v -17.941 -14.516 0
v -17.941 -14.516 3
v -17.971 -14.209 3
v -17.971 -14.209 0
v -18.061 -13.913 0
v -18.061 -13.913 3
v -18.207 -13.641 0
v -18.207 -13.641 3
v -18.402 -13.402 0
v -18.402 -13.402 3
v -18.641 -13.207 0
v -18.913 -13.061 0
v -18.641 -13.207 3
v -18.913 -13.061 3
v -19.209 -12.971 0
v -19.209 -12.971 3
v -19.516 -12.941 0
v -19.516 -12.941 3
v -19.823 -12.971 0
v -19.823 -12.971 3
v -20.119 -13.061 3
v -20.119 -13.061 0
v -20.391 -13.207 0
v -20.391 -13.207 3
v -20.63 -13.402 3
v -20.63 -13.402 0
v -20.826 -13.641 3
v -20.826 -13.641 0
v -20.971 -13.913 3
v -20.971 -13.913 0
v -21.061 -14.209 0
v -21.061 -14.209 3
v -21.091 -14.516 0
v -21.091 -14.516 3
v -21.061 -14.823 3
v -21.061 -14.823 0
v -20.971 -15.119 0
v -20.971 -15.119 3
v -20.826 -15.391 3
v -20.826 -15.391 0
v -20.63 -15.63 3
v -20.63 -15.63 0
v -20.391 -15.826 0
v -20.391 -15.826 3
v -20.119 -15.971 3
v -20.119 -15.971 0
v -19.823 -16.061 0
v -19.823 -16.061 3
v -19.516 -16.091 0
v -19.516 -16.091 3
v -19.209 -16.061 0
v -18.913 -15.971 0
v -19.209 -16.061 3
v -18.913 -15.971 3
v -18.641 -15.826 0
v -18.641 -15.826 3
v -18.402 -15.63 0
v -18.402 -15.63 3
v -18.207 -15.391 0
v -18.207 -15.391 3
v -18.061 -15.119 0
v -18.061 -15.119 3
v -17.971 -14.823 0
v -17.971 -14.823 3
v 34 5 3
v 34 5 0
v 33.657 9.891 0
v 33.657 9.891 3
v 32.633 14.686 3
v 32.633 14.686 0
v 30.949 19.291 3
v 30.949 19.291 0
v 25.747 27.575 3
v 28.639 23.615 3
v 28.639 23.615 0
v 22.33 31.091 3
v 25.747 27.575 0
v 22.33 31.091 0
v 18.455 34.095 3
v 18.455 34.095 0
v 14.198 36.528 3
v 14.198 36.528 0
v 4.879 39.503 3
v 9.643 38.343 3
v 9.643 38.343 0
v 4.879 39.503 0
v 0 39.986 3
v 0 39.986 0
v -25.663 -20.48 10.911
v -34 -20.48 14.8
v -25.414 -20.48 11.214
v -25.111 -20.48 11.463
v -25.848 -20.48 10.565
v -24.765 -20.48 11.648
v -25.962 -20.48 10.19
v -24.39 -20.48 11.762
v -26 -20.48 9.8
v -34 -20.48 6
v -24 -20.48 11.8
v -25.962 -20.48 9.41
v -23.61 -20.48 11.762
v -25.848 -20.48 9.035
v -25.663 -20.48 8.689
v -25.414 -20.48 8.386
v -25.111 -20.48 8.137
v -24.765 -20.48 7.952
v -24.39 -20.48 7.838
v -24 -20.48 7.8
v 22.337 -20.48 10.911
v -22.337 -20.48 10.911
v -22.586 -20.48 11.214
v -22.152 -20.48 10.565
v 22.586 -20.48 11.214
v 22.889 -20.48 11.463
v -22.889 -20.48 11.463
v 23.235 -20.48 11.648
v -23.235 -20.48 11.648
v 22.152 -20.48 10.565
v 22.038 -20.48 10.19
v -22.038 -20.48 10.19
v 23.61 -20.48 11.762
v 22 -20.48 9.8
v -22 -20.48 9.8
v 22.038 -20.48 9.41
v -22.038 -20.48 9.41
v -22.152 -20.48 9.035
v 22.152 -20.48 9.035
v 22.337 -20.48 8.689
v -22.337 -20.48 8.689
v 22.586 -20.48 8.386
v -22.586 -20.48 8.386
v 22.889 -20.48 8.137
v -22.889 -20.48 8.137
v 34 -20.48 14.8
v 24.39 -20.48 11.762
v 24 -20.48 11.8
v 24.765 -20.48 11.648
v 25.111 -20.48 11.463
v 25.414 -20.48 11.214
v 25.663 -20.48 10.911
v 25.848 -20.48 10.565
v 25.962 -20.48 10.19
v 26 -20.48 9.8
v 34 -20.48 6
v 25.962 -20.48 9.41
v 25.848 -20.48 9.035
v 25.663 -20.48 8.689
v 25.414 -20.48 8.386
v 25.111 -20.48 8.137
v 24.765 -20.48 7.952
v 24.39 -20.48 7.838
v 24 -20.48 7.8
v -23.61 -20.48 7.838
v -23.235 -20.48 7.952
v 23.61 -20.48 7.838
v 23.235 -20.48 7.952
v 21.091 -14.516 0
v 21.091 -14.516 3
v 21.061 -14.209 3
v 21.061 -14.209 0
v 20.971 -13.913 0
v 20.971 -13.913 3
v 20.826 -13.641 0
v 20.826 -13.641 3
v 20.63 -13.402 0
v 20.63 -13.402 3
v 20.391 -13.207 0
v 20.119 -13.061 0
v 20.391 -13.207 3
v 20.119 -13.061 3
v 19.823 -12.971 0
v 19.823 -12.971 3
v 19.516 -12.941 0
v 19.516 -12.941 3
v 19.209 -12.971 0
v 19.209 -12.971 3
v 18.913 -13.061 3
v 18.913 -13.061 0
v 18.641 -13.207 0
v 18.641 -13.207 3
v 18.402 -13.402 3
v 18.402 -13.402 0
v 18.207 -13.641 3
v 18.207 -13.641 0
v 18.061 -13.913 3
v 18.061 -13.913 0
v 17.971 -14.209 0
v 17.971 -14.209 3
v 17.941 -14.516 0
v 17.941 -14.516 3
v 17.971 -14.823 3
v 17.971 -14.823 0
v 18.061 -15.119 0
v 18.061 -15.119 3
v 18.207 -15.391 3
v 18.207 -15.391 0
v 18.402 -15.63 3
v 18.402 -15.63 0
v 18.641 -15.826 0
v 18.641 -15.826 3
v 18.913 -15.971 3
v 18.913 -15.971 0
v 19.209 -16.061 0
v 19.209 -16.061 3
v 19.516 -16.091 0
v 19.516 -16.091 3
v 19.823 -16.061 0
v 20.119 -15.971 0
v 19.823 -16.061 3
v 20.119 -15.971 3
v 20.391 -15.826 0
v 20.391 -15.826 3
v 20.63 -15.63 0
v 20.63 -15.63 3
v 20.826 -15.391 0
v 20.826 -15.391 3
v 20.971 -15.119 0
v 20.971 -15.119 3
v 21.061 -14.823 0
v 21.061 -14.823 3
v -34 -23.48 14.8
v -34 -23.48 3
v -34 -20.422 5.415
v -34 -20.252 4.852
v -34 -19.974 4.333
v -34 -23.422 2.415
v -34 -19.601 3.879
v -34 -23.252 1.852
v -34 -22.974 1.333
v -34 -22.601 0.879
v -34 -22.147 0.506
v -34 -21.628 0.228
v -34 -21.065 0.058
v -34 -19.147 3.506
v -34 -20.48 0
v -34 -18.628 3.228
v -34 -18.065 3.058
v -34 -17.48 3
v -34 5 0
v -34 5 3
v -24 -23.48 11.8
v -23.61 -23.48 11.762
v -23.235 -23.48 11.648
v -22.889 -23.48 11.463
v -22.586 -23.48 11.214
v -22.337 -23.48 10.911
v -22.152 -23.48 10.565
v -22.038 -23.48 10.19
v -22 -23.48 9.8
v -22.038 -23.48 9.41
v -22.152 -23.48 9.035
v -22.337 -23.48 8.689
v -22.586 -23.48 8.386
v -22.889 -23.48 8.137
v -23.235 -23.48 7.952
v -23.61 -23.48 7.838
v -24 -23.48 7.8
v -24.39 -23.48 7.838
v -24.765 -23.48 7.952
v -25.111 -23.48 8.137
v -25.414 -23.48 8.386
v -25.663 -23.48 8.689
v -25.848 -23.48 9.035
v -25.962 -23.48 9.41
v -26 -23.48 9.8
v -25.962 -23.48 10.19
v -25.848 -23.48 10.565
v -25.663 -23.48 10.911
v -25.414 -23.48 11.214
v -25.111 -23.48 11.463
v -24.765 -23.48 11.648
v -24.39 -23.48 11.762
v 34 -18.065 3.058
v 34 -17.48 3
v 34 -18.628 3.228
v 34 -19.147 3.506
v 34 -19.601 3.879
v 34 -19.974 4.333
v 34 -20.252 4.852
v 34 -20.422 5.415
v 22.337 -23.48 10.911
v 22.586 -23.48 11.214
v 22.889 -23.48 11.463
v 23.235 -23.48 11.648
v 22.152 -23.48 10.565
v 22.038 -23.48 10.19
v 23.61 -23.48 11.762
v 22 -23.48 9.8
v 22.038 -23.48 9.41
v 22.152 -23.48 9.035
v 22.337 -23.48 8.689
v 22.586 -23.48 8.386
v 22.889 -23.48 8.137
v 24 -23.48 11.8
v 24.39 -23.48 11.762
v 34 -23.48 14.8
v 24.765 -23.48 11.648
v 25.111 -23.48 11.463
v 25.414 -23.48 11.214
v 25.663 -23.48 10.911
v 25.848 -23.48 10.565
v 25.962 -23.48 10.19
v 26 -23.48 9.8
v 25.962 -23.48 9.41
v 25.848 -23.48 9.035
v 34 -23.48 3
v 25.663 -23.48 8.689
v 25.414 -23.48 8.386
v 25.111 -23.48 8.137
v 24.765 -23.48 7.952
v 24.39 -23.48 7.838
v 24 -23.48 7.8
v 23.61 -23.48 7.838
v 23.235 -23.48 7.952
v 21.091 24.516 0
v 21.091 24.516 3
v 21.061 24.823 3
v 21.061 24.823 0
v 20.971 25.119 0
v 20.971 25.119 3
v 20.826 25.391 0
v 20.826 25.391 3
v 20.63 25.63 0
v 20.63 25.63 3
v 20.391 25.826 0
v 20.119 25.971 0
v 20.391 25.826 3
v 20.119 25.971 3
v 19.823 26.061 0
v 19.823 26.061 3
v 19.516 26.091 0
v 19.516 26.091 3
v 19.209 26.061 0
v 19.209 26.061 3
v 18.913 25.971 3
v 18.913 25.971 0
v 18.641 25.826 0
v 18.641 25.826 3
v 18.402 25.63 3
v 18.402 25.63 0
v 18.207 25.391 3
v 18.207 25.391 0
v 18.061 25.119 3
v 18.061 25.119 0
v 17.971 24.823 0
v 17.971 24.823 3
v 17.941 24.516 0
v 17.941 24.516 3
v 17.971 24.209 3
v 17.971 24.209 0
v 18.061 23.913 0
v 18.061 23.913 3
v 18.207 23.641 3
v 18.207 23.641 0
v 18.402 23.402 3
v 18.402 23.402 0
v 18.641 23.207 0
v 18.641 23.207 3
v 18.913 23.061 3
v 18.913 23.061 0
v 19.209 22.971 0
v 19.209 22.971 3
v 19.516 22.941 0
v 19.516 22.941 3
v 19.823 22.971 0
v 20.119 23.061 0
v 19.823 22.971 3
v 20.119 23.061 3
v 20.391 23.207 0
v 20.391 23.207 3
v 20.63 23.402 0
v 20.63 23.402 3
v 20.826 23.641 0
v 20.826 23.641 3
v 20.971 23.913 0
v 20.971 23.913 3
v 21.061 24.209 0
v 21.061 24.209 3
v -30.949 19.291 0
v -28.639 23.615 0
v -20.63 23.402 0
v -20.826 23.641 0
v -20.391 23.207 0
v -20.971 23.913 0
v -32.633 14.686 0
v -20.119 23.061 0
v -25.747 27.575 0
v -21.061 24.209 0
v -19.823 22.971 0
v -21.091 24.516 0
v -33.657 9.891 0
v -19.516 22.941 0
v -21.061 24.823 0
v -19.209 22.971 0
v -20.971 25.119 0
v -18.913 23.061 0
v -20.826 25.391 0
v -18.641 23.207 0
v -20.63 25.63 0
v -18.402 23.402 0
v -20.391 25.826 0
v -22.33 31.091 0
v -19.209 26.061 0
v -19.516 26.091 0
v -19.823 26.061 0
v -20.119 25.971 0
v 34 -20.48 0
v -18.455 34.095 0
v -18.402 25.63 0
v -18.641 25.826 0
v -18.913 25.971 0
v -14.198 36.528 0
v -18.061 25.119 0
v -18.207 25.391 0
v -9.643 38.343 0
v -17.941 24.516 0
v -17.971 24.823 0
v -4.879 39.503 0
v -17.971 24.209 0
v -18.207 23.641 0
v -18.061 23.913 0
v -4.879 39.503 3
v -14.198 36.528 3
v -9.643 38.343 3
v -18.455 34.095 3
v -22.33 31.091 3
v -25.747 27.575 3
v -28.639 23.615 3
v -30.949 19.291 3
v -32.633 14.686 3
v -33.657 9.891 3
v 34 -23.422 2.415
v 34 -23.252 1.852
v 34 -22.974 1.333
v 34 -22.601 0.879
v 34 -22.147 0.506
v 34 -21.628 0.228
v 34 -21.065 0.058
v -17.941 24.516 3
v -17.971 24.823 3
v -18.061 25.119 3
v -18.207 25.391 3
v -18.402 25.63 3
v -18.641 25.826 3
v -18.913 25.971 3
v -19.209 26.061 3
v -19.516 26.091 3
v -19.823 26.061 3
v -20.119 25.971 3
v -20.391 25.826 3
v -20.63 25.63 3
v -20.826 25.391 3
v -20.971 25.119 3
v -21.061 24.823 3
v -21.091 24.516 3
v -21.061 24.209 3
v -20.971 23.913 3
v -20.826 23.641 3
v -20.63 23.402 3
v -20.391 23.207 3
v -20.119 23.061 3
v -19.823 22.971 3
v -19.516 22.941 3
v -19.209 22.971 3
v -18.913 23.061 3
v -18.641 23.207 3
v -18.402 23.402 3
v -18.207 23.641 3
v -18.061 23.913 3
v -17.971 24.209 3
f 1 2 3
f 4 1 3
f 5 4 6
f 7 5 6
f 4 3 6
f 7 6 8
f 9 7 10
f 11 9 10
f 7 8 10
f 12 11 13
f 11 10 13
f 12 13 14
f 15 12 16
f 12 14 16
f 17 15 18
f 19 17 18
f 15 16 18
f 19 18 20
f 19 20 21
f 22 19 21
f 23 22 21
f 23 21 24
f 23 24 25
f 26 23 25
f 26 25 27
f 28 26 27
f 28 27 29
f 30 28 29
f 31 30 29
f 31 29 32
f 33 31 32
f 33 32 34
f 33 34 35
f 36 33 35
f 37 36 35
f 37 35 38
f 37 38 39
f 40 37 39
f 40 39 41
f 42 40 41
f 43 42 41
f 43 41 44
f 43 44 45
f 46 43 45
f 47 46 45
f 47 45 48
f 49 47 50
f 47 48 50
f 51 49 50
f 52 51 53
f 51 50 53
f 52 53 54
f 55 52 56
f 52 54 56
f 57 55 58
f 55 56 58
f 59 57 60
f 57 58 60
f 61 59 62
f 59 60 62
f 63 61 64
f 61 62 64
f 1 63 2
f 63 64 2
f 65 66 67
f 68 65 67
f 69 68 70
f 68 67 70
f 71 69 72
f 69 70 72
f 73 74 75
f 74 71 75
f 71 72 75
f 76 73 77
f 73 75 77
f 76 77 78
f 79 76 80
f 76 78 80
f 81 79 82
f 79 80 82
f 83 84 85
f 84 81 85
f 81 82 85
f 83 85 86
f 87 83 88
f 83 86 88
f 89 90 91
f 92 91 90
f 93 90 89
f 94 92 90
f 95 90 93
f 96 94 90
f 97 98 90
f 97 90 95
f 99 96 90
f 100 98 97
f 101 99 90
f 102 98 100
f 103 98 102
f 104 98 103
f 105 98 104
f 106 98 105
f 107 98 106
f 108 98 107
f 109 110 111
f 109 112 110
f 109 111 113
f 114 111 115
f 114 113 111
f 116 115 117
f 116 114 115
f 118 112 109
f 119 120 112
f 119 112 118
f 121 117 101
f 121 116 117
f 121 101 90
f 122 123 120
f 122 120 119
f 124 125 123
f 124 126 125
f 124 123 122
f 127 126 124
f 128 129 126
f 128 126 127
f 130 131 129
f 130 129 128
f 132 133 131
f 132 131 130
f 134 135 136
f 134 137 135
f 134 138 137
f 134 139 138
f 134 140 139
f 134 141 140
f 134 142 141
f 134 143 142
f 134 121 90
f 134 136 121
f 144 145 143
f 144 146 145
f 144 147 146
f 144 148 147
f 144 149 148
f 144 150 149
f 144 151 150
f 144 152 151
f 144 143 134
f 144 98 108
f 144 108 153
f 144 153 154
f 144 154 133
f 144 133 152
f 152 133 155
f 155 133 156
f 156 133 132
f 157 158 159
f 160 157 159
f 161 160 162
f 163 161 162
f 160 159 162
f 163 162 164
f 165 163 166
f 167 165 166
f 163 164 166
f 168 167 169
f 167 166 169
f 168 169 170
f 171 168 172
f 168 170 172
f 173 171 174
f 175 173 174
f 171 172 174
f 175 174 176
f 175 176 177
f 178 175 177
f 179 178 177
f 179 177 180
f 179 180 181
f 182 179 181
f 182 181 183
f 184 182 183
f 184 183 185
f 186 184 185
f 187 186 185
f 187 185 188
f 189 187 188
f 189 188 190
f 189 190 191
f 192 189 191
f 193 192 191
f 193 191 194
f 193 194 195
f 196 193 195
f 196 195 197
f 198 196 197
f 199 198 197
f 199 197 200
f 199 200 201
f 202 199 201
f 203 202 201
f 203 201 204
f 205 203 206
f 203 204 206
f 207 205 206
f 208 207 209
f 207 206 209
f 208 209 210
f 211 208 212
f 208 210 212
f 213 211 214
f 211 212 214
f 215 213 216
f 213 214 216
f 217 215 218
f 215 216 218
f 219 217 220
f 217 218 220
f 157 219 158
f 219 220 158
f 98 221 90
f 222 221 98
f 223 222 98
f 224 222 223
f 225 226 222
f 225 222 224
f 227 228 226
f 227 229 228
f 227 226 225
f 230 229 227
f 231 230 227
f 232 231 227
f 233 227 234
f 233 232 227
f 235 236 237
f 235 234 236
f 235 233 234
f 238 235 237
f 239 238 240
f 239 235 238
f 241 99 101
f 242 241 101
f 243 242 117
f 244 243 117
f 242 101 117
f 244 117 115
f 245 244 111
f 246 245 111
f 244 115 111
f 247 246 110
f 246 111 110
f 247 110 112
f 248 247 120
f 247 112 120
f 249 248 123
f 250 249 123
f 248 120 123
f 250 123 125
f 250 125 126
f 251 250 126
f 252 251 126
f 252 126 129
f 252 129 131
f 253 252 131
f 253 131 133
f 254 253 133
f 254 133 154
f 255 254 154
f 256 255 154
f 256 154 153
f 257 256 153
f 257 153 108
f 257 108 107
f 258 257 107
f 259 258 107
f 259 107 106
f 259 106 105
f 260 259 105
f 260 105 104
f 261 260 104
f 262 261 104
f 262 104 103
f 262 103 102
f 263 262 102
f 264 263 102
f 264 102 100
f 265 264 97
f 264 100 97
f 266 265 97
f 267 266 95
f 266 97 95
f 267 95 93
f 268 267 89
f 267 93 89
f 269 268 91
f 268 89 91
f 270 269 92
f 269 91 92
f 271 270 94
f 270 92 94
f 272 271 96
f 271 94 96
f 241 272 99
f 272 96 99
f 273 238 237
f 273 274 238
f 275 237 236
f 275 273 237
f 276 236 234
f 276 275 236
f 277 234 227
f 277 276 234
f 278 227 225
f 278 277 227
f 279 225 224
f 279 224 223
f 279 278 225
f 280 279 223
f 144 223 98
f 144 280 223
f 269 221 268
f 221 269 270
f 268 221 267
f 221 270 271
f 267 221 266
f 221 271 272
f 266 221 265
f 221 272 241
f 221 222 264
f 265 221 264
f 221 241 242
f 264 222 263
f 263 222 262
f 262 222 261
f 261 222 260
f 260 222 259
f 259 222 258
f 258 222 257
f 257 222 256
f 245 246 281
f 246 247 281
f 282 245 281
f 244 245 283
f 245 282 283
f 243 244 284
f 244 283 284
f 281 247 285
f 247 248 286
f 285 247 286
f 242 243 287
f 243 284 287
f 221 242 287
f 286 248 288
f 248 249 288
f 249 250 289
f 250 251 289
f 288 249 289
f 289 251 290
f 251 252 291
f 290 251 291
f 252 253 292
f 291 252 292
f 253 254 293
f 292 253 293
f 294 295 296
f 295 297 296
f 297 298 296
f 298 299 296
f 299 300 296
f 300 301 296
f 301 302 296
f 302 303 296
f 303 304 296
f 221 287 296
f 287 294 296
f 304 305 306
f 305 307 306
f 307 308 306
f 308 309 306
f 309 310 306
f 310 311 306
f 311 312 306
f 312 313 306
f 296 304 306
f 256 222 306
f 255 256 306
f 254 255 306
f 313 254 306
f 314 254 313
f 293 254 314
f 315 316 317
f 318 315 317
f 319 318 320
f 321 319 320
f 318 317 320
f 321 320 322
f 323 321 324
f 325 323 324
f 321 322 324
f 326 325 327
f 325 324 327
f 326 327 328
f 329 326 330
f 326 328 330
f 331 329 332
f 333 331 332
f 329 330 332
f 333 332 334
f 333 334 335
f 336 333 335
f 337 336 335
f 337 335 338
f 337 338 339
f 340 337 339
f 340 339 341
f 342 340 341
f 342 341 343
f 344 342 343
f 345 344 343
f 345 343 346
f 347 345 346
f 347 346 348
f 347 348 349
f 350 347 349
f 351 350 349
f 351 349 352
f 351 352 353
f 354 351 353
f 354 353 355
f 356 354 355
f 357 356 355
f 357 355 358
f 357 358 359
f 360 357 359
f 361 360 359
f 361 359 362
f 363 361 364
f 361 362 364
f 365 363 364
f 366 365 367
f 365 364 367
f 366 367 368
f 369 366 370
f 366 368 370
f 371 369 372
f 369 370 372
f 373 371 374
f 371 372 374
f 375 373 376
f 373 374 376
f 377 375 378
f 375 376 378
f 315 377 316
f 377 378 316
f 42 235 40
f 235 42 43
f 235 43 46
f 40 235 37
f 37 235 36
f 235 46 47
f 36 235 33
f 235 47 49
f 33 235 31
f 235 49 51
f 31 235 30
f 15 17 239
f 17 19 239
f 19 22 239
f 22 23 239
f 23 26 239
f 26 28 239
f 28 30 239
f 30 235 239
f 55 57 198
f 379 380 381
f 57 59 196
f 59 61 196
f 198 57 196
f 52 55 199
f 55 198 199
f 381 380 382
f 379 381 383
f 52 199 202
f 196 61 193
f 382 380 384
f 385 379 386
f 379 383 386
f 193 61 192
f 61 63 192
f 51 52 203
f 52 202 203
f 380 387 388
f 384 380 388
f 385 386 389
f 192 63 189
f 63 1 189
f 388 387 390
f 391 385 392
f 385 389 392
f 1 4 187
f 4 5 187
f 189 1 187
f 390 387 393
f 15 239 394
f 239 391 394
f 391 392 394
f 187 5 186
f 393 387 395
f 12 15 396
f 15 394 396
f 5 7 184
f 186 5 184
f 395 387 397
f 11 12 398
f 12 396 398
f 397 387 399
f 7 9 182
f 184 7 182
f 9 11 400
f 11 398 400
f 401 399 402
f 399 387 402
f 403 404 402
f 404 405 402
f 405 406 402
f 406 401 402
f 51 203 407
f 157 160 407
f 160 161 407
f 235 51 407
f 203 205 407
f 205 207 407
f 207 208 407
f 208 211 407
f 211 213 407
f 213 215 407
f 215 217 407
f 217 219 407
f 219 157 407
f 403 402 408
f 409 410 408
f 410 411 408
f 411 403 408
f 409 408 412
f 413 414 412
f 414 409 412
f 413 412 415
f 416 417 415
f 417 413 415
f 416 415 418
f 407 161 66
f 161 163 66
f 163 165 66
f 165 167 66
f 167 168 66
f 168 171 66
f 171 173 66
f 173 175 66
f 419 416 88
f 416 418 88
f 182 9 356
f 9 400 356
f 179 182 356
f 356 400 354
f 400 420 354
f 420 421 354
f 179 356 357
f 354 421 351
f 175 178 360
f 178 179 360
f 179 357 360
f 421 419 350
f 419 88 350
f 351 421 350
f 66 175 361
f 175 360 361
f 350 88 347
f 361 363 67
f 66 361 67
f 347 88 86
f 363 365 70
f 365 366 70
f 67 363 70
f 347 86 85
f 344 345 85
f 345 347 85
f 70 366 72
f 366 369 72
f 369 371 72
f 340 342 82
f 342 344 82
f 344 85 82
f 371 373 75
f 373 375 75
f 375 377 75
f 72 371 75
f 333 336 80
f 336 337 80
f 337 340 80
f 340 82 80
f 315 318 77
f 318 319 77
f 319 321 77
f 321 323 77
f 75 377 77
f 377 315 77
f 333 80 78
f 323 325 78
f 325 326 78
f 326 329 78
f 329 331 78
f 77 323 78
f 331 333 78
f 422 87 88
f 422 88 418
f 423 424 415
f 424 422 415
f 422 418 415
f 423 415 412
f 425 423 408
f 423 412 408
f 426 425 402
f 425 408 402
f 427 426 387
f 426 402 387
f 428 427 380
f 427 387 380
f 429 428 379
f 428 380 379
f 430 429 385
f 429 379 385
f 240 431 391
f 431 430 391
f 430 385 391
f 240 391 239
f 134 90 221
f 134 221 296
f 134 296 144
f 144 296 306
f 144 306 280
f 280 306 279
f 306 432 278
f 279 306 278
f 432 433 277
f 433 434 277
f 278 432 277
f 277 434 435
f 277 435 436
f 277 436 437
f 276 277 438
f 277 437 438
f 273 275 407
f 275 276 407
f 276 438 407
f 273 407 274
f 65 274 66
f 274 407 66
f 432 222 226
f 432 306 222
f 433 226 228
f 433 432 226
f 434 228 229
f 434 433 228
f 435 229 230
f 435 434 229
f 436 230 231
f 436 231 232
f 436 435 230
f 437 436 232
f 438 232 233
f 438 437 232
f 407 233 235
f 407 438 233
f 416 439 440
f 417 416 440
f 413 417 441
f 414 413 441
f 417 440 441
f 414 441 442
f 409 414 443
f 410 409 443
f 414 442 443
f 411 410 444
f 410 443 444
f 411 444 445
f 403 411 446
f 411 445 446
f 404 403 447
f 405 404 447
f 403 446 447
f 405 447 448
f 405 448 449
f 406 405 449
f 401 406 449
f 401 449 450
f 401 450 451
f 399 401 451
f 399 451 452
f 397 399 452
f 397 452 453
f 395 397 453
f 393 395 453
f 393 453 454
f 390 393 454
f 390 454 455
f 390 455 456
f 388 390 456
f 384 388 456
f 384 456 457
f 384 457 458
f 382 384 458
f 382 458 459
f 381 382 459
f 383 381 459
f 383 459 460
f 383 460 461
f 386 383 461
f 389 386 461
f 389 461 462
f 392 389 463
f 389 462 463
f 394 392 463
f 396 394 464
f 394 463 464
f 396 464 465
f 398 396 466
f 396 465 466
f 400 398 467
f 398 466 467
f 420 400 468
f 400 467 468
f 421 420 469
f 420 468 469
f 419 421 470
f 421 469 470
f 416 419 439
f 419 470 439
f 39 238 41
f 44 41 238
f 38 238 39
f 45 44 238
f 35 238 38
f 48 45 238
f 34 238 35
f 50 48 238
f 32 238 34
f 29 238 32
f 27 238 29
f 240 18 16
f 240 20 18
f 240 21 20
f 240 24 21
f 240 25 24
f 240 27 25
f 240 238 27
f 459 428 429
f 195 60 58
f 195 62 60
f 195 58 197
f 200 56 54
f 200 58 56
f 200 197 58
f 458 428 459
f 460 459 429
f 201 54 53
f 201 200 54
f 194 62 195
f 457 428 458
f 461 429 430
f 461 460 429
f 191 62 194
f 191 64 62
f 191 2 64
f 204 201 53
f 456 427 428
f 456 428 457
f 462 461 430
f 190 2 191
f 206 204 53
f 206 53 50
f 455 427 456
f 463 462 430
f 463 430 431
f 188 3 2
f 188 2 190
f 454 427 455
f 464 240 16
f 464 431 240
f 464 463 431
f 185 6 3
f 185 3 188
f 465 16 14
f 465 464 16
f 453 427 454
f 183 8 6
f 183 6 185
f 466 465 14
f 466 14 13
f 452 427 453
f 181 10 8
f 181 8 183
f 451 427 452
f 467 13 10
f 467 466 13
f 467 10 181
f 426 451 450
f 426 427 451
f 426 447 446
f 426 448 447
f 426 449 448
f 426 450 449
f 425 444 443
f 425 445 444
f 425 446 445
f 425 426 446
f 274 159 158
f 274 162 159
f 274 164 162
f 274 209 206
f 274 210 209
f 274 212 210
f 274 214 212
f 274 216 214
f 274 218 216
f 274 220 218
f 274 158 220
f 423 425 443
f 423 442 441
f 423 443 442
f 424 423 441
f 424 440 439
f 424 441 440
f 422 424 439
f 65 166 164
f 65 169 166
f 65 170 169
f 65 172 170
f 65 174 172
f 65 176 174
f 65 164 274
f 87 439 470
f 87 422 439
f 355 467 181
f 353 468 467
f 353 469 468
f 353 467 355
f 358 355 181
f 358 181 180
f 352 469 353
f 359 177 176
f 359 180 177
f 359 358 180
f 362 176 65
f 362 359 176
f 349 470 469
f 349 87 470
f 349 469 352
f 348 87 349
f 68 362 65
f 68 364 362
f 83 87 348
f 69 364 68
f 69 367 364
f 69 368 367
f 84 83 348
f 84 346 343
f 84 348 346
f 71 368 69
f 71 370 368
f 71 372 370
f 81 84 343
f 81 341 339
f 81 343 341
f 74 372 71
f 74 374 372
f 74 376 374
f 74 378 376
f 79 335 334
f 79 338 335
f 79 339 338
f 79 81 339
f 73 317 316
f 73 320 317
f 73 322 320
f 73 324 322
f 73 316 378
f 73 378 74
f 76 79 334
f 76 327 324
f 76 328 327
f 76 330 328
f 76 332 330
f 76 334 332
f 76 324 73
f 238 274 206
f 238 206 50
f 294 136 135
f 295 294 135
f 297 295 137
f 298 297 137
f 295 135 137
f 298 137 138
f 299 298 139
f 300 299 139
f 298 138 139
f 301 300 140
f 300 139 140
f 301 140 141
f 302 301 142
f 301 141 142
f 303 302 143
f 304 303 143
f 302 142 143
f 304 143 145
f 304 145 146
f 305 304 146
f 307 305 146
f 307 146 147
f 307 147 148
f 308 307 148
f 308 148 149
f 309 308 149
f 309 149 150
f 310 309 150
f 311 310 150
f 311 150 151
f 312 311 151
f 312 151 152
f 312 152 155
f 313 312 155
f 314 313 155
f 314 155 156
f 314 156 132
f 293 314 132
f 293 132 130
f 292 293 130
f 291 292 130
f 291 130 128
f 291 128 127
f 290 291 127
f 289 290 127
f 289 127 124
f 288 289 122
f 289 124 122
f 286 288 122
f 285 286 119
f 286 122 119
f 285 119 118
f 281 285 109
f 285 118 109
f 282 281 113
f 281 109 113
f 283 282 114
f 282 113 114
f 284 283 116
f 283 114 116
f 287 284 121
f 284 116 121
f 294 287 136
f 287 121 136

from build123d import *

# Parameters (mm, degrees)
SKETCH_1_W          = 68
SKETCH_1_H          = 80
EXTRUDE_1_DEPTH     = 3
SKETCH_2_R          = 1.575
CUT_EXTRUDE_1_DEPTH = 53.583267301
SKETCH_4_W          = 68
SKETCH_4_H          = 16.52
CUT_EXTRUDE_2_DEPTH = 53.583267301
SKETCH_5_W          = 68
SKETCH_5_H          = 3
EXTRUDE_2_DEPTH     = 11.8
FILLET_1_R          = 3
SKETCH_6_R          = 2
CUT_EXTRUDE_3_DEPTH = 14.5
FILLET_2_R          = 35


with BuildPart() as part:
    # 草图1 → 凸台-拉伸1 (new body)
    with BuildSketch(Plane.XY):
        Rectangle(SKETCH_1_W, SKETCH_1_H)
    extrude(amount=EXTRUDE_1_DEPTH)

    # 草图2 → 切除-拉伸1 (cut, through all)
    with BuildSketch(Plane.XY.offset(3)):
        with Locations((-19.516147161, 24.516147161)):
            Circle(SKETCH_2_R)
        with Locations((19.516147161, 24.516147161)):
            Circle(SKETCH_2_R)
        with Locations((-19.516147161, -14.516147161)):
            Circle(SKETCH_2_R)
        with Locations((19.516147161, -14.516147161)):
            Circle(SKETCH_2_R)
    extrude(amount=-CUT_EXTRUDE_1_DEPTH, mode=Mode.SUBTRACT)

    # 草图4 → 切除-拉伸2 (cut, through all)
    with BuildSketch(Plane.XY.offset(3)):
        with Locations((0, -31.74)):
            Rectangle(SKETCH_4_W, SKETCH_4_H)
    extrude(amount=-CUT_EXTRUDE_2_DEPTH, mode=Mode.SUBTRACT)

    # 草图5 → 凸台-拉伸2 (add)
    with BuildSketch(Plane.XY.offset(3)):
        with Locations((0, -21.98)):
            Rectangle(SKETCH_5_W, SKETCH_5_H)
    extrude(amount=EXTRUDE_2_DEPTH)

    # 圆角1
    fillet_1_edges = [part.edges().sort_by_distance(p)[0] for p in [
        (0, -23.48, 0),
        (0, -20.48, 3),
    ]]
    fillet(fillet_1_edges, radius=FILLET_1_R)

    # 草图6 → 切除-拉伸3 (cut)
    with BuildSketch(Plane(origin=(0, -20.48, 0), x_dir=(1, 0, 0), z_dir=(0, 1, 0))):
        with Locations(Location((24, -9.8, 0), (0, 0, 270))):
            Circle(SKETCH_6_R)
        with Locations(Location((-24, -9.8, 0), (0, 0, 270))):
            Circle(SKETCH_6_R)
    extrude(amount=-CUT_EXTRUDE_3_DEPTH, mode=Mode.SUBTRACT)

    # 圆角2
    # the kernel refuses this fillet: 35 mm, written as the material it takes off along each edge
    with BuildSketch(Plane(origin=(34, 40, -87.5), x_dir=(-1, 0, 0), z_dir=(0, 0, 1)), Plane(origin=(-34, 40, -87.5), x_dir=(0, -1, 0), z_dir=(0, 0, 1))) as fillet_2_piece_1:
        with BuildLine():
            CenterArc((FILLET_2_R, FILLET_2_R), FILLET_2_R, 180, 90)
            Line((0, FILLET_2_R), (0, 0))
            Line((0, 0), (FILLET_2_R, 0))
        make_face()
    extrude(amount=178, mode=Mode.SUBTRACT)


solid = part.part
